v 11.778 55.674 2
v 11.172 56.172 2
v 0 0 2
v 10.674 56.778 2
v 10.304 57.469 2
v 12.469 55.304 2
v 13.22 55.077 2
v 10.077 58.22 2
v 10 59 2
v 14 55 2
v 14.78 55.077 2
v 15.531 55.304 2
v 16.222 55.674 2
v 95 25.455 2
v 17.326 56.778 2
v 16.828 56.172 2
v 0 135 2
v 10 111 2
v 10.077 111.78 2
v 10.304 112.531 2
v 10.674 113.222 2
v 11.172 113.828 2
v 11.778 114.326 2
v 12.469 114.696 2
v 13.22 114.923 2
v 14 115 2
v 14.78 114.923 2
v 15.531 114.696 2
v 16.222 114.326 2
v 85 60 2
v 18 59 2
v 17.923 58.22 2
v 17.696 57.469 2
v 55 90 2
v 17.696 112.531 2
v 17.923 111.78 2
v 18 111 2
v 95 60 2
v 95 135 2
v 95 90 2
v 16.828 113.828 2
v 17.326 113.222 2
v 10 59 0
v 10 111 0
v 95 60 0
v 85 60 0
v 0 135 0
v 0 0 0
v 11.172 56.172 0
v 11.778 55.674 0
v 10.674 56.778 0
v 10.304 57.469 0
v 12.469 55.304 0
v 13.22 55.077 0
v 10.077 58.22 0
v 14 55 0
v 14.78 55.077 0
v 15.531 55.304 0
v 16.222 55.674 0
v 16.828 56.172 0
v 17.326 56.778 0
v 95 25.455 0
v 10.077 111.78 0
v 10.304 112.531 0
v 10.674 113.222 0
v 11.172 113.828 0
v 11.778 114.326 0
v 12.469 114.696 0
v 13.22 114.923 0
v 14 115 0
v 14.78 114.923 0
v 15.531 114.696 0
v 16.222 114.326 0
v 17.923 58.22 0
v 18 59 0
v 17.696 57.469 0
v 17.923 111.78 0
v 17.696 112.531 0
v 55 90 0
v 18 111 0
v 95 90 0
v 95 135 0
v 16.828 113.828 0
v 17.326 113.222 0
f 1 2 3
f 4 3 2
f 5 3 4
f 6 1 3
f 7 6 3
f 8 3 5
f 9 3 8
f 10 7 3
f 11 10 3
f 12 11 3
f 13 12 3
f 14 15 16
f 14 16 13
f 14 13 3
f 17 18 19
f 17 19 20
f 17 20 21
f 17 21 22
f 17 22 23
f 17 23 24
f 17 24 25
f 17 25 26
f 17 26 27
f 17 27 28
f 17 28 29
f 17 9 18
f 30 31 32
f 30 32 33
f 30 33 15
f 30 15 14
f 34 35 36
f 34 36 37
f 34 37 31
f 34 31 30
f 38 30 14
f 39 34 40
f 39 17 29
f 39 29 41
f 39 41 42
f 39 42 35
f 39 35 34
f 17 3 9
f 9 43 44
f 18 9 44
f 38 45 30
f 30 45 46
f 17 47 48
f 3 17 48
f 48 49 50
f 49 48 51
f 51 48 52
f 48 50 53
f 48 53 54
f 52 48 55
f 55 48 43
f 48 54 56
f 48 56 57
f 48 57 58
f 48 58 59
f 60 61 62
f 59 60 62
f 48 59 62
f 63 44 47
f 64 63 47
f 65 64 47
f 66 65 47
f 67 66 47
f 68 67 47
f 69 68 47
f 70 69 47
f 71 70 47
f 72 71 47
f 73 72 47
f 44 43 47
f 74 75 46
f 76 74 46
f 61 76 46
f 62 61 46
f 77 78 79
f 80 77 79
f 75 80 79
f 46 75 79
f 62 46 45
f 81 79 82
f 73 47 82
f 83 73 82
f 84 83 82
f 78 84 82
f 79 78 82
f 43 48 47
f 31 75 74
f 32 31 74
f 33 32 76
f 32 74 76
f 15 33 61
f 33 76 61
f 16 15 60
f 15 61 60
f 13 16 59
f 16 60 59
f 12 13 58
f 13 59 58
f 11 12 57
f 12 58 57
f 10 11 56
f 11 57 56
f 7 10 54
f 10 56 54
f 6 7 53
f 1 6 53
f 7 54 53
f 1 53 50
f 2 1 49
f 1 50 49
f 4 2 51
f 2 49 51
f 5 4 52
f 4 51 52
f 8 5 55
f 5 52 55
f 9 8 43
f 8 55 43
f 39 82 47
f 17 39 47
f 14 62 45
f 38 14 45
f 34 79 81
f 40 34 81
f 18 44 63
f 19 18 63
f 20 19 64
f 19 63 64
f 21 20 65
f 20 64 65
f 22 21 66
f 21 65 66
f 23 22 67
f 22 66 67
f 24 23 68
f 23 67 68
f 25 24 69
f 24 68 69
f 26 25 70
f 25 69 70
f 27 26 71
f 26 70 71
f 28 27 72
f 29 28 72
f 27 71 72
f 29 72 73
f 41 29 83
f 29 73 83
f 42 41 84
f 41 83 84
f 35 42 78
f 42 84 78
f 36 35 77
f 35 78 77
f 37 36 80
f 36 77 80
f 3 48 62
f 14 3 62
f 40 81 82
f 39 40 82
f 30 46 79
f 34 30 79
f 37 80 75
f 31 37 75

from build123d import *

# Parameters (mm, degrees)
AUFSATZ_LINEAR_AUSTRAGEN1_DEPTH = 2


with BuildPart() as part:
    # Skizze2 → Aufsatz-Linear austragen1 (new body)
    with BuildSketch(Plane.XY):
        Polygon((0, 0), (95, 25.455173281), (95, 60), (85, 60), (55, 90), (95, 90), (95, 135), (0, 135), align=None)
        with BuildLine():
            Line((18, 111), (18, 59))
            ThreePointArc((18, 59), (14, 55), (10, 59))
            Line((10, 59), (10, 111))
            ThreePointArc((10, 111), (14, 115), (18, 111))
        make_face(mode=Mode.SUBTRACT)
    extrude(amount=AUFSATZ_LINEAR_AUSTRAGEN1_DEPTH)


solid = part.part
